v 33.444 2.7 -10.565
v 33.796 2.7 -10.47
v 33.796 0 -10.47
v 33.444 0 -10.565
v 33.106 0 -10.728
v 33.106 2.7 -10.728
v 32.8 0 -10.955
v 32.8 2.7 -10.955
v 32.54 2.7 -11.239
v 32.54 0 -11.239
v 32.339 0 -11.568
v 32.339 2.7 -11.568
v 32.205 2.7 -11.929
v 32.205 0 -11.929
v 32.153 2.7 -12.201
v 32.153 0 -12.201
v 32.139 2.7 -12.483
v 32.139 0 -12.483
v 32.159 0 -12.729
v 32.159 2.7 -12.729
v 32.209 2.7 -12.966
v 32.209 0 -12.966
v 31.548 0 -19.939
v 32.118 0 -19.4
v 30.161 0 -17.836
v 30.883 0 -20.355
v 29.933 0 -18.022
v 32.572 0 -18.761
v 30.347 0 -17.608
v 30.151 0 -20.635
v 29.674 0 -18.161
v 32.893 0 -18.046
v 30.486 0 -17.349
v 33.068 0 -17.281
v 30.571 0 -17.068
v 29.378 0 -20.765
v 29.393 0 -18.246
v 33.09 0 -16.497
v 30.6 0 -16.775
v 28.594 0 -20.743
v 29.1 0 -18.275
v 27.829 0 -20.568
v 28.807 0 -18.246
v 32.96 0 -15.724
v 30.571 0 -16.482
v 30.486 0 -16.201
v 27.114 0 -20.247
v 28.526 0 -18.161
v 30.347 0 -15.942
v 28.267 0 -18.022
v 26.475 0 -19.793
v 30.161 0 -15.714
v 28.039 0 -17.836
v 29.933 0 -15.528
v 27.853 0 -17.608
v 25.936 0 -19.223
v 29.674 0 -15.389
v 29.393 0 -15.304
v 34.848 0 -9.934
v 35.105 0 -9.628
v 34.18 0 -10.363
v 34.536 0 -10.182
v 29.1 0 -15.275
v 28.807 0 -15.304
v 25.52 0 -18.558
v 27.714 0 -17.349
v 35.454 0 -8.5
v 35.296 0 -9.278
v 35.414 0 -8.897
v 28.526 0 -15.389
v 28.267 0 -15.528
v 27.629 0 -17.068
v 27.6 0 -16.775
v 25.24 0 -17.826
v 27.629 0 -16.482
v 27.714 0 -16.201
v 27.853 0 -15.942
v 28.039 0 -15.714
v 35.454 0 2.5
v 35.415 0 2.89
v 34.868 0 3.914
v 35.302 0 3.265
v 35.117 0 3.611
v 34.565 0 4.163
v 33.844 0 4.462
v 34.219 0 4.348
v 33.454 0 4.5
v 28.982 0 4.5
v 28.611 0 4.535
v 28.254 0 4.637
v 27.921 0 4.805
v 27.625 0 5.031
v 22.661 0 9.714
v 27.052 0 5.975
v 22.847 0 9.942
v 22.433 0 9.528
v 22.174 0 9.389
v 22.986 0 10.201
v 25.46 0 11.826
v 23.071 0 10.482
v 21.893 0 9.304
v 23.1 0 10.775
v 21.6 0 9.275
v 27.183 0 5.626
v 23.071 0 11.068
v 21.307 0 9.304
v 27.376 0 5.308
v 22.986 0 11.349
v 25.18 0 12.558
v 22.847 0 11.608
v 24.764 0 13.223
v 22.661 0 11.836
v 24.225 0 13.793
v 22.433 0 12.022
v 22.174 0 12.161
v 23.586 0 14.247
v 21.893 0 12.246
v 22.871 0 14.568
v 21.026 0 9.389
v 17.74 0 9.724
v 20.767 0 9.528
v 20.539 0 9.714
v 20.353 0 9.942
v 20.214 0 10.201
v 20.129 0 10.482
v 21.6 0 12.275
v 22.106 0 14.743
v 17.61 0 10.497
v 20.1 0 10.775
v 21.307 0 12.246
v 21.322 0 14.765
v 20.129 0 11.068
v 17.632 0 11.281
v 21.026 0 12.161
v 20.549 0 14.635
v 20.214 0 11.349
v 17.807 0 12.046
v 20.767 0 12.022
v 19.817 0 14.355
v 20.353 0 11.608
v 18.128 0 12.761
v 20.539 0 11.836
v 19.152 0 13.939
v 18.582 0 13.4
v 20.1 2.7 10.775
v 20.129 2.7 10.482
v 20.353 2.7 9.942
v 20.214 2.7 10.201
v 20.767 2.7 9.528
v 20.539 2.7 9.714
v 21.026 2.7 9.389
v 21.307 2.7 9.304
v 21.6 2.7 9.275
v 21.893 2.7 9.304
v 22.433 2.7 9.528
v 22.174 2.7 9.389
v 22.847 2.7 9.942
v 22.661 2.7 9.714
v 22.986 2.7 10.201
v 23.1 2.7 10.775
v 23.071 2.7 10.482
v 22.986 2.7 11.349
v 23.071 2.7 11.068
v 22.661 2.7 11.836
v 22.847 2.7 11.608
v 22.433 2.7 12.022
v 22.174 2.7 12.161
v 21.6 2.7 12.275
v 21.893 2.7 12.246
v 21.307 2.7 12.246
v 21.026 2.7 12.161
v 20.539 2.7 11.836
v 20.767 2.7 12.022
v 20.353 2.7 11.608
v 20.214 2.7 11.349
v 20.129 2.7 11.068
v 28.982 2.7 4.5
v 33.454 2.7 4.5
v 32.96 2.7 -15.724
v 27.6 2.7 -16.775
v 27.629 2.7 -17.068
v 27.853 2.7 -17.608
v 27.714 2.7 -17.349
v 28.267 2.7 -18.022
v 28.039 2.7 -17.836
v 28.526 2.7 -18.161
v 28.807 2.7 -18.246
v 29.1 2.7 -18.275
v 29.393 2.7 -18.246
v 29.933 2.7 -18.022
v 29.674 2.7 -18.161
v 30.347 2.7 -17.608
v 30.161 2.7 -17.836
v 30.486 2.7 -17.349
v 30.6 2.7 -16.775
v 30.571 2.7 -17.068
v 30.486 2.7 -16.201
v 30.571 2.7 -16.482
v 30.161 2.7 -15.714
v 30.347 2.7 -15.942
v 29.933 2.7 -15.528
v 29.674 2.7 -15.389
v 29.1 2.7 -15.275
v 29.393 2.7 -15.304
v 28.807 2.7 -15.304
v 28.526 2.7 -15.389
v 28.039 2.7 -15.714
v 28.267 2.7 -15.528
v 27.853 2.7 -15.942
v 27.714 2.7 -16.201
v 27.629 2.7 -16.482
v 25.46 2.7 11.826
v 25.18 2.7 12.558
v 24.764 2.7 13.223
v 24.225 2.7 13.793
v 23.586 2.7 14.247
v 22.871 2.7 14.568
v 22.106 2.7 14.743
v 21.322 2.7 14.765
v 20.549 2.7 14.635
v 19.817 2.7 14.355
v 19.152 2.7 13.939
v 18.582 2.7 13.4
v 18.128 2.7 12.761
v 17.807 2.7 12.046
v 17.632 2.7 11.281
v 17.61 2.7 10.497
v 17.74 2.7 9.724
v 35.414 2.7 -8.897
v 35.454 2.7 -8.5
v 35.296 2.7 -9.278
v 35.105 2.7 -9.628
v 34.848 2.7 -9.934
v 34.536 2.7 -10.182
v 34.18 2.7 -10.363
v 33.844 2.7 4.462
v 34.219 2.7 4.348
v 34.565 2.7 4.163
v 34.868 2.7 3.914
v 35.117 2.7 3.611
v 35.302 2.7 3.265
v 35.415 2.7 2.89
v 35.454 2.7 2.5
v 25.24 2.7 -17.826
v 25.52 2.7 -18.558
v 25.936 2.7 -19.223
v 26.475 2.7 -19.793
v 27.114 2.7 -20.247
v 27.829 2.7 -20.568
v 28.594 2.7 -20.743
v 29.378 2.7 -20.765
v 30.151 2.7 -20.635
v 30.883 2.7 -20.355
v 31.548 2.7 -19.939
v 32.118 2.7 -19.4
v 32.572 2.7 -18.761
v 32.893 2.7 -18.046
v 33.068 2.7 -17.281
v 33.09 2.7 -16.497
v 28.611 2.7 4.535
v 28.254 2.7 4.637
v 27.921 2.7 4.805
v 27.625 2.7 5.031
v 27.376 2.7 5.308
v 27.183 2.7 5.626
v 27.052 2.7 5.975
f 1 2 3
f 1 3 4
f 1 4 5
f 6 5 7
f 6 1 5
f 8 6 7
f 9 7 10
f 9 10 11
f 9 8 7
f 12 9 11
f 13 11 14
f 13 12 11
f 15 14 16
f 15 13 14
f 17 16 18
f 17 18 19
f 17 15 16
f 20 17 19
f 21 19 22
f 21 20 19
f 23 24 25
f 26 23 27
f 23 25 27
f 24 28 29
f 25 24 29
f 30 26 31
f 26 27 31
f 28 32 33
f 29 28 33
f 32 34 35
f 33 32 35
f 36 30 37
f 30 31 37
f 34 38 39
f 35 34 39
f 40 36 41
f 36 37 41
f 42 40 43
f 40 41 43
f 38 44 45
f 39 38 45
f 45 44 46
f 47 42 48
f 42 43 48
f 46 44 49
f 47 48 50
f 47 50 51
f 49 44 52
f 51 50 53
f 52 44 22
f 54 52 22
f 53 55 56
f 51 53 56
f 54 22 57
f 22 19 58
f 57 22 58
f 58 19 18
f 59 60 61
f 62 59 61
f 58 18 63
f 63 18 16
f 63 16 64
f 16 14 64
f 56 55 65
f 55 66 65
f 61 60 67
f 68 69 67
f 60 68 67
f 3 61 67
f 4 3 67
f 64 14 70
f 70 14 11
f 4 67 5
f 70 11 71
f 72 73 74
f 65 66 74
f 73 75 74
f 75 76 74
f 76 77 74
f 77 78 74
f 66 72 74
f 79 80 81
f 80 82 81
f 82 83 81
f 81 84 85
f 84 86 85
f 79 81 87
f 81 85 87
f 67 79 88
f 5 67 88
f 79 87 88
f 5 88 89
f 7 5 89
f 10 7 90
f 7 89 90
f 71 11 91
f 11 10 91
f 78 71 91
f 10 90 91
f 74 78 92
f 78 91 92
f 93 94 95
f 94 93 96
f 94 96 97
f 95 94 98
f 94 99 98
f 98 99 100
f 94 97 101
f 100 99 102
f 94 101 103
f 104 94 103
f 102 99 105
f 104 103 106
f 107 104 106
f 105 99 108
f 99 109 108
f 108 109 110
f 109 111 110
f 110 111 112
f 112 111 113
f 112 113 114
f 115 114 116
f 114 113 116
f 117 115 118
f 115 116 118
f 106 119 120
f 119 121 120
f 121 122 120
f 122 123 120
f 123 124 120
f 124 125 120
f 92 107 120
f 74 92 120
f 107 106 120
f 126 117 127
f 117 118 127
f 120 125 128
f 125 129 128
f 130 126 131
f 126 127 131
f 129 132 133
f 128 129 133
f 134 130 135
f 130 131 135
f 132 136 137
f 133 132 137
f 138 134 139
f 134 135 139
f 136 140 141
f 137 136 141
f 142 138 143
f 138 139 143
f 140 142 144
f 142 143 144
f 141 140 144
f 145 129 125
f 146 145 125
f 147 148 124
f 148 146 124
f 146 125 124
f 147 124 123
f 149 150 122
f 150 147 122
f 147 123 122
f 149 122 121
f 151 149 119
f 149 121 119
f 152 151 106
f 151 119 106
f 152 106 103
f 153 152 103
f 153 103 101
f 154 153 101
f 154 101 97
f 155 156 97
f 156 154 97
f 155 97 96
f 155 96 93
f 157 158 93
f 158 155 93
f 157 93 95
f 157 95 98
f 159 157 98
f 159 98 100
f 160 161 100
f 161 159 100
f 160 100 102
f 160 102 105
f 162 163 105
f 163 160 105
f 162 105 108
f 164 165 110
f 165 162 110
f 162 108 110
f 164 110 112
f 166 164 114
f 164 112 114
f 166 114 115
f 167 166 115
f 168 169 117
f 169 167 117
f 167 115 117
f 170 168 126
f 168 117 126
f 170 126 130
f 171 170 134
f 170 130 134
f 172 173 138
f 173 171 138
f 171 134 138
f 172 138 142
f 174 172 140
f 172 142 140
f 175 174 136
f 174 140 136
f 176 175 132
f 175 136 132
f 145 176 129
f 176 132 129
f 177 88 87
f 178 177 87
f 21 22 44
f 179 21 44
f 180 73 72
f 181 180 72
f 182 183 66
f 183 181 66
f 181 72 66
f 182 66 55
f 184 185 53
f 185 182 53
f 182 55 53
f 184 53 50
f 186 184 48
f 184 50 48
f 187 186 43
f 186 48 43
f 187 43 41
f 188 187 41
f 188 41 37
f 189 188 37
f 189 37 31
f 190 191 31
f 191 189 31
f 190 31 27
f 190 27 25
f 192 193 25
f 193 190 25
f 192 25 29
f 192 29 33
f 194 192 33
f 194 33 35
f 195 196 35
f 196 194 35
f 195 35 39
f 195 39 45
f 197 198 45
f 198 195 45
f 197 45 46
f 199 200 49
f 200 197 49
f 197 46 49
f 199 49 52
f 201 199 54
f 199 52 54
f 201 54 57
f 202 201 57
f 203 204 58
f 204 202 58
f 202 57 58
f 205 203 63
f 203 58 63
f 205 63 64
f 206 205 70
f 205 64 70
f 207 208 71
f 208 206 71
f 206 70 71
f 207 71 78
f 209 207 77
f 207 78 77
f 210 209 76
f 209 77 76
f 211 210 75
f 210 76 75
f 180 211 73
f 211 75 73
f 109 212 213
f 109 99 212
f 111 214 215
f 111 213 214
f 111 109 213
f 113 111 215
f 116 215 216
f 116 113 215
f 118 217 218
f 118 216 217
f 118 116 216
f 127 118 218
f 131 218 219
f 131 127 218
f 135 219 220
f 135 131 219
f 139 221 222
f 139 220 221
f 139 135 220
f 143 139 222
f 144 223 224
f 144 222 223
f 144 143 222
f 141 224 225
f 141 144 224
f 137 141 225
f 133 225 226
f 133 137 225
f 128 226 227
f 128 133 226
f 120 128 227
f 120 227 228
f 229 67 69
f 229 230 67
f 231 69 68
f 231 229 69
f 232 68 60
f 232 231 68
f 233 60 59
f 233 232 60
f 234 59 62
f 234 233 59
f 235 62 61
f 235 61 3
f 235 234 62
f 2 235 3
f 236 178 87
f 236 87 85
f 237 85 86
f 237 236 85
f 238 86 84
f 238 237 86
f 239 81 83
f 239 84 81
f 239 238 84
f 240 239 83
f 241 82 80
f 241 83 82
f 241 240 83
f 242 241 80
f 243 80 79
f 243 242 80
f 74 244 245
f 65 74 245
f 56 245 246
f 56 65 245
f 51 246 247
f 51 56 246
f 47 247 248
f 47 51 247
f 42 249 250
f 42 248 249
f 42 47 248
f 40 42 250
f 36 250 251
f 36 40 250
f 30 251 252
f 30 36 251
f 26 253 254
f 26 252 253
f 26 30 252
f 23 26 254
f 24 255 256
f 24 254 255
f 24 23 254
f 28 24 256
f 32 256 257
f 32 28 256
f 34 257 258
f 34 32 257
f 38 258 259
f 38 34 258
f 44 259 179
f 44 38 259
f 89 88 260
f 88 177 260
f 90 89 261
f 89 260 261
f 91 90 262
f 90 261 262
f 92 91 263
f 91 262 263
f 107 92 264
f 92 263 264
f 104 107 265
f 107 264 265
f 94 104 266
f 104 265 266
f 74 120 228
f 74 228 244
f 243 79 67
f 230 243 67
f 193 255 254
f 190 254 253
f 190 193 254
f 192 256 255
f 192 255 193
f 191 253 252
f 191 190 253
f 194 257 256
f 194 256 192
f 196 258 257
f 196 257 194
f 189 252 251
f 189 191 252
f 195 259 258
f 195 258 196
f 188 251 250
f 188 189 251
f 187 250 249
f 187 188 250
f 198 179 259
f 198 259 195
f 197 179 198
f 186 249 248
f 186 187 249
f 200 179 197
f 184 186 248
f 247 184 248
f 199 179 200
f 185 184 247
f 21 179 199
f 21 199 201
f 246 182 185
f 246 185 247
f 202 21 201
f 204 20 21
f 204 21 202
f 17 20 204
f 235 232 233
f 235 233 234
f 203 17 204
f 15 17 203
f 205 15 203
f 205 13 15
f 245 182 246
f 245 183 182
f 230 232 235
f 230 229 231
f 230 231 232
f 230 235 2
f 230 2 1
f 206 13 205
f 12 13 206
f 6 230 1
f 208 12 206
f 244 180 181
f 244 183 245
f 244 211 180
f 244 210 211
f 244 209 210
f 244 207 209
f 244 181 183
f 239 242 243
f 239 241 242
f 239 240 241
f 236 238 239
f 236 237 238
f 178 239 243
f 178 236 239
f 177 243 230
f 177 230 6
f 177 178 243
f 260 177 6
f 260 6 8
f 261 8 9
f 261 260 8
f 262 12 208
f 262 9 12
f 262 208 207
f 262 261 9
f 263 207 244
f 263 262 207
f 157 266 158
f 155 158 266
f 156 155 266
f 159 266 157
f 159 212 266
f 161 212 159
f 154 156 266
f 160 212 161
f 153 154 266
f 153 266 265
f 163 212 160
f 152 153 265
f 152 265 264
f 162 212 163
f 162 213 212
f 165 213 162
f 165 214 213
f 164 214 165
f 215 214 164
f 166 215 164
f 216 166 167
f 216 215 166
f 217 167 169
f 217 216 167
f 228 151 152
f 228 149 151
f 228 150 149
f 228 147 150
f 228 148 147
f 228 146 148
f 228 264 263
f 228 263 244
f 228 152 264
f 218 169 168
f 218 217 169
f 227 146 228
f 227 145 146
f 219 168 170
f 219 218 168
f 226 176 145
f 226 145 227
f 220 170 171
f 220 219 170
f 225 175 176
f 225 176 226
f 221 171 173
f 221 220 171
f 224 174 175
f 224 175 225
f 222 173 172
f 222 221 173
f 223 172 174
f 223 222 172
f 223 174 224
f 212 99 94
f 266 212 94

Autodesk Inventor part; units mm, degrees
ref_plane "YZ Plane" through (0, 0, 0) normal (1, 0, 0) x (0, 1, 0)
ref_plane "XZ Plane" through (0, 0, 0) normal (0, 1, 0) x (-1, 0, 0)
ref_plane "XY Plane" through (0, 0, 0) normal (0, 0, 1) x (1, 0, 0)
sketch "Sketch1" plane through (0, 0, 0) normal (0, 1, 0) x (-1, 0, 0)
  line L0 (0, -3) -> (-10, -3)
  circle A0 centre (-21.6, 10.775) radius 1.5
  line L1 (0, 35) -> (-45, 35)
  line L2 (0, 0) -> (0, 35)
  circle A1 centre (-29.1, -16.775) radius 1.5
  arc A2 (-17.7405, 9.7243) -> (-25.4595, 11.8257) centre (-21.6, 10.775) ccw
  arc A3 (-32.9595, -15.7243) -> (-25.2405, -17.8257) centre (-29.1, -16.775) ccw
  line L3 (-17.7405, 9.7243) -> (-25.2405, -17.8257)
  line L4 (-27.4538, 4.5) -> (-35.4538, 4.5)
  line L5 (-35.4538, 4.5) -> (-35.4538, -10.5)
  line L6 (-35.4538, -10.5) -> (-31.5373, -10.5)
  line L7 (-25.4595, 11.8257) -> (-27.4538, 4.5)
  line L8 (-31.5373, -10.5) -> (-32.9595, -15.7243)
  point P0 (-35.4538, -3)
  dimension "d0" = 10
  dimension "d1" = 3
  dimension "d2" = 13.775
  dimension "d3" = 3
  dimension "d7" = 45
  dimension "d8" = 35
  dimension "d9" = 23.4
  dimension "d10" = 3
  dimension "d11" = 13.775
  dimension "d12" = 15.9
  dimension "d13" = 2.5
  dimension "d14" = 2.5
  dimension "d15" = 15
  dimension "d16" = 8
extrude "Extrusion1" add sketch "Sketch1" along normal blind 2.7
fillet "Fillet1" radius 2 4 edges at (35.4538, 1.35, 4.5) (27.4538, 1.35, 4.5) (35.4538, 1.35, -10.5) (31.5373, 1.35, -10.5)
properties part number "SujecionServo"
